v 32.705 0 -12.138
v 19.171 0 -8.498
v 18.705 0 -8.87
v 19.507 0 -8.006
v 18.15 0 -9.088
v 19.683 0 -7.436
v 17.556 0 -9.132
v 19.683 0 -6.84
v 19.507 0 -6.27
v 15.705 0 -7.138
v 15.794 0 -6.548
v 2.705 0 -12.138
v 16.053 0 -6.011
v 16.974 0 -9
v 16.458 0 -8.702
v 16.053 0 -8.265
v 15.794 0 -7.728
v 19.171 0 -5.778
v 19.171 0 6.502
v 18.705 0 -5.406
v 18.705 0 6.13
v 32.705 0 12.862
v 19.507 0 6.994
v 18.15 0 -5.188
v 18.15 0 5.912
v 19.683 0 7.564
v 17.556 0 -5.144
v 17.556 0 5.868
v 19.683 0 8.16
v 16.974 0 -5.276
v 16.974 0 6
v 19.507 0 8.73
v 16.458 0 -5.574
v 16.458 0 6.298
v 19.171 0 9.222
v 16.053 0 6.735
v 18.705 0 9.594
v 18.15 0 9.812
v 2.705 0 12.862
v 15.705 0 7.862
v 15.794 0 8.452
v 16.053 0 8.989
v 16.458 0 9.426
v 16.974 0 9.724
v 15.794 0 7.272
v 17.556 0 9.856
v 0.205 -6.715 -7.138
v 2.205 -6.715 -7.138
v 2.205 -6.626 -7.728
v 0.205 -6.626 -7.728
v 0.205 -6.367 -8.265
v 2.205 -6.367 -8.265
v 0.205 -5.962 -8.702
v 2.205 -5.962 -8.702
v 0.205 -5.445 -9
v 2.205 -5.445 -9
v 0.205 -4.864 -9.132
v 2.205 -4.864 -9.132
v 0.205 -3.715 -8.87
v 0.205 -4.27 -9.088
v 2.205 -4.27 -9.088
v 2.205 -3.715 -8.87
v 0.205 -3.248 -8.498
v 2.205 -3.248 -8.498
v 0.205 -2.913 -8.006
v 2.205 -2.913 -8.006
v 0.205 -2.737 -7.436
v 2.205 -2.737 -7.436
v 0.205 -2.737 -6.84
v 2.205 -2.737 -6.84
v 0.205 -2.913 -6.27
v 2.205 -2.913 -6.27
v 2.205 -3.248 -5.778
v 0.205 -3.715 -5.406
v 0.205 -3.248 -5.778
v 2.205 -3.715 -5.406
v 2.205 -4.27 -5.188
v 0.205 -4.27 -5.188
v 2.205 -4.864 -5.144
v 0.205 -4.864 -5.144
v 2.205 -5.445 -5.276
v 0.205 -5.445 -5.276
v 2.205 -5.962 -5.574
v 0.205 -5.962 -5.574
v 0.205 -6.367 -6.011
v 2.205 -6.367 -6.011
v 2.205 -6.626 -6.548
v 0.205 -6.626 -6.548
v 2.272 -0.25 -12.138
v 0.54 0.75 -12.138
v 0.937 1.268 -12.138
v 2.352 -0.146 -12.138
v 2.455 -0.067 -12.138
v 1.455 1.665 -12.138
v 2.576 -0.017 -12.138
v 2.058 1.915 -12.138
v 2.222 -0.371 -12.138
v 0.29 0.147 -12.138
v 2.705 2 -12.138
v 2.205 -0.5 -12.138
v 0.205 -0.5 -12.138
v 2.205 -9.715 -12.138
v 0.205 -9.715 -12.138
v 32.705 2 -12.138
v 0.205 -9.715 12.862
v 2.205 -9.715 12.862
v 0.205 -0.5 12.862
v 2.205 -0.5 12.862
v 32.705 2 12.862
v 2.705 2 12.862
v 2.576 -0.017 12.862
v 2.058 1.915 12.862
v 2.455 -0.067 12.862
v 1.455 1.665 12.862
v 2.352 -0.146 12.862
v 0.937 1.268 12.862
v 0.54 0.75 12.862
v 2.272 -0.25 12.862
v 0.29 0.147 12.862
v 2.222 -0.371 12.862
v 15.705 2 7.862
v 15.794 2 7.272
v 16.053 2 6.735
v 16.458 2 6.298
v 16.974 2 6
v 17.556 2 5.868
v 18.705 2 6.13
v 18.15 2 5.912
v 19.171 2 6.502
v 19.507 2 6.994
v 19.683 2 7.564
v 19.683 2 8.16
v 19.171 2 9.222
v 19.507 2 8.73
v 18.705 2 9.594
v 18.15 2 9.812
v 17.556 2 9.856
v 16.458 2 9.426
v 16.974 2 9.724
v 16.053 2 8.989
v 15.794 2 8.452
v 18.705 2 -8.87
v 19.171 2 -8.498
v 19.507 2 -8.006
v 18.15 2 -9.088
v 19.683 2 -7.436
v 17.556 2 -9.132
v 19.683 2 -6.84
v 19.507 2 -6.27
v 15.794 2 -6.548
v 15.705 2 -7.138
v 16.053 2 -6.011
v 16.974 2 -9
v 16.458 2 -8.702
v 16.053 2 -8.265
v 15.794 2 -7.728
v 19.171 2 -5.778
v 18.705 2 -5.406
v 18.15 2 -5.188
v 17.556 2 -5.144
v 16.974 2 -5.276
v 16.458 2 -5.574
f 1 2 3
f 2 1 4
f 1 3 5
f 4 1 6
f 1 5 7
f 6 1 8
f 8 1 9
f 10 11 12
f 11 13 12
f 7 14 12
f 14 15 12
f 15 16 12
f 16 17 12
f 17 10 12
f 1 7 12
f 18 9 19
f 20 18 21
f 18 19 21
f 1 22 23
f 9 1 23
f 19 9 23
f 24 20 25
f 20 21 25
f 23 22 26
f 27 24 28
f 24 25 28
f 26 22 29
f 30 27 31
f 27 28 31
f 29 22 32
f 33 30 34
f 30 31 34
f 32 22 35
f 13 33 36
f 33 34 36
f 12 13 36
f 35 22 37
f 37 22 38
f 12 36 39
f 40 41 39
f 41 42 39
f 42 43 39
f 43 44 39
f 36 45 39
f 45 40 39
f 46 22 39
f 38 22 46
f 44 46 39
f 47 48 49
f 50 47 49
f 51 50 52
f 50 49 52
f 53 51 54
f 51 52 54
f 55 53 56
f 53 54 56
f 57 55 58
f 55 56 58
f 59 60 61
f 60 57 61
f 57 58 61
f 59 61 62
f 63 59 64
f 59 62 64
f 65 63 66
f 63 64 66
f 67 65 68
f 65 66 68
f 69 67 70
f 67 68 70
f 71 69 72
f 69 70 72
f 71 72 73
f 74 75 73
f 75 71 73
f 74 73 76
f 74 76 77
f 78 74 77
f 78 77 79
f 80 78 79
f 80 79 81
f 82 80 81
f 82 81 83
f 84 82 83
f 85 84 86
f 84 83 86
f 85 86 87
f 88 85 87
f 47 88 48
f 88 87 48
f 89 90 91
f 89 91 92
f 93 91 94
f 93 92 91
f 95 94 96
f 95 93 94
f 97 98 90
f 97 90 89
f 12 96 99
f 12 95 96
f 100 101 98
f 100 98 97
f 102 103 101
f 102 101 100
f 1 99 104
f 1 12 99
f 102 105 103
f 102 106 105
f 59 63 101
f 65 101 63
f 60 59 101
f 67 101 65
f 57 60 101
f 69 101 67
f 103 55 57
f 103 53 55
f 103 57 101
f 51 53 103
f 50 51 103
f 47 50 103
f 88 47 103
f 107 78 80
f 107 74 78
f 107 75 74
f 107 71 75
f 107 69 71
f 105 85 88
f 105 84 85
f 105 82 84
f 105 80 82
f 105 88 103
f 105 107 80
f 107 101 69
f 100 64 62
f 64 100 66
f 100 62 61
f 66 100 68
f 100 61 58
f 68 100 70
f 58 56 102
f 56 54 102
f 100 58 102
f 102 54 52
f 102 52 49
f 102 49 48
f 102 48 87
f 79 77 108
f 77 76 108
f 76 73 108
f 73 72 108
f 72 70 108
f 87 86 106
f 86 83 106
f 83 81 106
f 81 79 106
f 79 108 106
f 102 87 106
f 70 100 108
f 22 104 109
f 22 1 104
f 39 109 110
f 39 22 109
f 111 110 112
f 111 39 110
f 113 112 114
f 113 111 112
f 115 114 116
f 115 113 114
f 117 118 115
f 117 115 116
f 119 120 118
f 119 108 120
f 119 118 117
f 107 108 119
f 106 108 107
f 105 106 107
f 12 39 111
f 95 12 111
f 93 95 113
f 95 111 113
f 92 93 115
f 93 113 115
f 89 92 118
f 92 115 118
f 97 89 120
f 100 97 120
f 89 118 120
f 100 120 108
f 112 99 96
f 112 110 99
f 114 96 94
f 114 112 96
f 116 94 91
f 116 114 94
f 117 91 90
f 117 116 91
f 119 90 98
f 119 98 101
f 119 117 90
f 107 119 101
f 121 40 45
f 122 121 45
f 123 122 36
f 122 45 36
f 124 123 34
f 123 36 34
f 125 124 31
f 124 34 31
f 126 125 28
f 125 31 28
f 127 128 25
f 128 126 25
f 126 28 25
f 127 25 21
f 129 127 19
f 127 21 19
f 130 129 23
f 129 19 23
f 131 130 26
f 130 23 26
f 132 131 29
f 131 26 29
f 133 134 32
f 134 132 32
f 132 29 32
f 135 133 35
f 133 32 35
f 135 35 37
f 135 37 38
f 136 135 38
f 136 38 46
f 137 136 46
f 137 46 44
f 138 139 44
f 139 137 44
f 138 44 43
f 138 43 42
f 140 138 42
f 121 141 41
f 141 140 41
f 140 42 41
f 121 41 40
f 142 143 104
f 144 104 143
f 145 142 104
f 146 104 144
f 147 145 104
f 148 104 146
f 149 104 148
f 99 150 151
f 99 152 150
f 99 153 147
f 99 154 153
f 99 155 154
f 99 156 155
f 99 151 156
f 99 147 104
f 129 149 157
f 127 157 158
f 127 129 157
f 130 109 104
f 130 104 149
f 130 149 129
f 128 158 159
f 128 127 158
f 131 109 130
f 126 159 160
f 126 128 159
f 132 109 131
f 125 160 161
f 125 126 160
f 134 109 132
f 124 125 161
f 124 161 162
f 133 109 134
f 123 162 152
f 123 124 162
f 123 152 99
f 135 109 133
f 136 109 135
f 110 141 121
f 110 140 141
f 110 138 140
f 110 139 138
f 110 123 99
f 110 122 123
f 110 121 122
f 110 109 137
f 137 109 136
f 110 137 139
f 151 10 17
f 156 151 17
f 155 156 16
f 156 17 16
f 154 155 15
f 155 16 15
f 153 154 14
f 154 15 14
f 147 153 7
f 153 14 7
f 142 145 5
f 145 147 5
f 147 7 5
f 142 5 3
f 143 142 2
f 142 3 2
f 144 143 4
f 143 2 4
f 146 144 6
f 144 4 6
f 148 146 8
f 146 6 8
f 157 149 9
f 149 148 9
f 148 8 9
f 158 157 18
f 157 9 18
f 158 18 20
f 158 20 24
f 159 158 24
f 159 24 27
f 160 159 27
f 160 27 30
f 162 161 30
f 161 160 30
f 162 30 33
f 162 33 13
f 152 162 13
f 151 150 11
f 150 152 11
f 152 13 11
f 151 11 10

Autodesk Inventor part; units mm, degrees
ref_plane "YZ Plane" through (0, 0, 0) normal (1, 0, 0) x (0, 1, 0)
ref_plane "XZ Plane" through (0, 0, 0) normal (0, 1, 0) x (-1, 0, 0)
ref_plane "XY Plane" through (0, 0, 0) normal (0, 0, 1) x (1, 0, 0)
sketch "Boceto1" plane through (0, 0, 0) normal (0, 1, 0) x (-1, 0, 0)
  line L0 (7.2949, 12.862) -> (7.2949, -12.138)
  line L1 (7.2949, -12.138) -> (-32.7051, -12.138)
  line L2 (-32.7051, -12.138) -> (-32.7051, 12.862)
  line L3 (-32.7051, 12.862) -> (7.2949, 12.862)
  line L4 (-2.7051, -12.138) -> (-2.7051, 12.862)
  circle A0 centre (-17.7051, -7.138) radius 2
  circle A1 centre (-17.7051, 7.862) radius 2
  line L5 (7.2949, -12.138) -> (2.2949, -12.138)
  circle A2 centre (2.2949, -7.138) radius 2
  point P0 (0, 0)
  dimension "d0" = 25
  dimension "d1" = 40
  dimension "d11" = 4
  dimension "d12" = 4
  dimension "d13" = 5
  dimension "d14" = 5
  dimension "d15" = 15
  dimension "d16" = 15
  dimension "d18" = 4
  dimension "d19" = 5
  dimension "d20" = 5
extrude "Extrusión2" add sketch "Boceto1" along normal blind 2 contours L4 L1 L2 L3
extrude "Extrusión3" add sketch "Boceto1" along normal blind 2 contours L0 L1 L4 L3
bend part "Pieza de plegado1" radius 0.5 angle 90 line through (2.7051, 0, -12.138) along (0, 0, 1) centre toward (0, -1, 0) moving side (-1, 0, 0) both sides no
properties part number "leche"
